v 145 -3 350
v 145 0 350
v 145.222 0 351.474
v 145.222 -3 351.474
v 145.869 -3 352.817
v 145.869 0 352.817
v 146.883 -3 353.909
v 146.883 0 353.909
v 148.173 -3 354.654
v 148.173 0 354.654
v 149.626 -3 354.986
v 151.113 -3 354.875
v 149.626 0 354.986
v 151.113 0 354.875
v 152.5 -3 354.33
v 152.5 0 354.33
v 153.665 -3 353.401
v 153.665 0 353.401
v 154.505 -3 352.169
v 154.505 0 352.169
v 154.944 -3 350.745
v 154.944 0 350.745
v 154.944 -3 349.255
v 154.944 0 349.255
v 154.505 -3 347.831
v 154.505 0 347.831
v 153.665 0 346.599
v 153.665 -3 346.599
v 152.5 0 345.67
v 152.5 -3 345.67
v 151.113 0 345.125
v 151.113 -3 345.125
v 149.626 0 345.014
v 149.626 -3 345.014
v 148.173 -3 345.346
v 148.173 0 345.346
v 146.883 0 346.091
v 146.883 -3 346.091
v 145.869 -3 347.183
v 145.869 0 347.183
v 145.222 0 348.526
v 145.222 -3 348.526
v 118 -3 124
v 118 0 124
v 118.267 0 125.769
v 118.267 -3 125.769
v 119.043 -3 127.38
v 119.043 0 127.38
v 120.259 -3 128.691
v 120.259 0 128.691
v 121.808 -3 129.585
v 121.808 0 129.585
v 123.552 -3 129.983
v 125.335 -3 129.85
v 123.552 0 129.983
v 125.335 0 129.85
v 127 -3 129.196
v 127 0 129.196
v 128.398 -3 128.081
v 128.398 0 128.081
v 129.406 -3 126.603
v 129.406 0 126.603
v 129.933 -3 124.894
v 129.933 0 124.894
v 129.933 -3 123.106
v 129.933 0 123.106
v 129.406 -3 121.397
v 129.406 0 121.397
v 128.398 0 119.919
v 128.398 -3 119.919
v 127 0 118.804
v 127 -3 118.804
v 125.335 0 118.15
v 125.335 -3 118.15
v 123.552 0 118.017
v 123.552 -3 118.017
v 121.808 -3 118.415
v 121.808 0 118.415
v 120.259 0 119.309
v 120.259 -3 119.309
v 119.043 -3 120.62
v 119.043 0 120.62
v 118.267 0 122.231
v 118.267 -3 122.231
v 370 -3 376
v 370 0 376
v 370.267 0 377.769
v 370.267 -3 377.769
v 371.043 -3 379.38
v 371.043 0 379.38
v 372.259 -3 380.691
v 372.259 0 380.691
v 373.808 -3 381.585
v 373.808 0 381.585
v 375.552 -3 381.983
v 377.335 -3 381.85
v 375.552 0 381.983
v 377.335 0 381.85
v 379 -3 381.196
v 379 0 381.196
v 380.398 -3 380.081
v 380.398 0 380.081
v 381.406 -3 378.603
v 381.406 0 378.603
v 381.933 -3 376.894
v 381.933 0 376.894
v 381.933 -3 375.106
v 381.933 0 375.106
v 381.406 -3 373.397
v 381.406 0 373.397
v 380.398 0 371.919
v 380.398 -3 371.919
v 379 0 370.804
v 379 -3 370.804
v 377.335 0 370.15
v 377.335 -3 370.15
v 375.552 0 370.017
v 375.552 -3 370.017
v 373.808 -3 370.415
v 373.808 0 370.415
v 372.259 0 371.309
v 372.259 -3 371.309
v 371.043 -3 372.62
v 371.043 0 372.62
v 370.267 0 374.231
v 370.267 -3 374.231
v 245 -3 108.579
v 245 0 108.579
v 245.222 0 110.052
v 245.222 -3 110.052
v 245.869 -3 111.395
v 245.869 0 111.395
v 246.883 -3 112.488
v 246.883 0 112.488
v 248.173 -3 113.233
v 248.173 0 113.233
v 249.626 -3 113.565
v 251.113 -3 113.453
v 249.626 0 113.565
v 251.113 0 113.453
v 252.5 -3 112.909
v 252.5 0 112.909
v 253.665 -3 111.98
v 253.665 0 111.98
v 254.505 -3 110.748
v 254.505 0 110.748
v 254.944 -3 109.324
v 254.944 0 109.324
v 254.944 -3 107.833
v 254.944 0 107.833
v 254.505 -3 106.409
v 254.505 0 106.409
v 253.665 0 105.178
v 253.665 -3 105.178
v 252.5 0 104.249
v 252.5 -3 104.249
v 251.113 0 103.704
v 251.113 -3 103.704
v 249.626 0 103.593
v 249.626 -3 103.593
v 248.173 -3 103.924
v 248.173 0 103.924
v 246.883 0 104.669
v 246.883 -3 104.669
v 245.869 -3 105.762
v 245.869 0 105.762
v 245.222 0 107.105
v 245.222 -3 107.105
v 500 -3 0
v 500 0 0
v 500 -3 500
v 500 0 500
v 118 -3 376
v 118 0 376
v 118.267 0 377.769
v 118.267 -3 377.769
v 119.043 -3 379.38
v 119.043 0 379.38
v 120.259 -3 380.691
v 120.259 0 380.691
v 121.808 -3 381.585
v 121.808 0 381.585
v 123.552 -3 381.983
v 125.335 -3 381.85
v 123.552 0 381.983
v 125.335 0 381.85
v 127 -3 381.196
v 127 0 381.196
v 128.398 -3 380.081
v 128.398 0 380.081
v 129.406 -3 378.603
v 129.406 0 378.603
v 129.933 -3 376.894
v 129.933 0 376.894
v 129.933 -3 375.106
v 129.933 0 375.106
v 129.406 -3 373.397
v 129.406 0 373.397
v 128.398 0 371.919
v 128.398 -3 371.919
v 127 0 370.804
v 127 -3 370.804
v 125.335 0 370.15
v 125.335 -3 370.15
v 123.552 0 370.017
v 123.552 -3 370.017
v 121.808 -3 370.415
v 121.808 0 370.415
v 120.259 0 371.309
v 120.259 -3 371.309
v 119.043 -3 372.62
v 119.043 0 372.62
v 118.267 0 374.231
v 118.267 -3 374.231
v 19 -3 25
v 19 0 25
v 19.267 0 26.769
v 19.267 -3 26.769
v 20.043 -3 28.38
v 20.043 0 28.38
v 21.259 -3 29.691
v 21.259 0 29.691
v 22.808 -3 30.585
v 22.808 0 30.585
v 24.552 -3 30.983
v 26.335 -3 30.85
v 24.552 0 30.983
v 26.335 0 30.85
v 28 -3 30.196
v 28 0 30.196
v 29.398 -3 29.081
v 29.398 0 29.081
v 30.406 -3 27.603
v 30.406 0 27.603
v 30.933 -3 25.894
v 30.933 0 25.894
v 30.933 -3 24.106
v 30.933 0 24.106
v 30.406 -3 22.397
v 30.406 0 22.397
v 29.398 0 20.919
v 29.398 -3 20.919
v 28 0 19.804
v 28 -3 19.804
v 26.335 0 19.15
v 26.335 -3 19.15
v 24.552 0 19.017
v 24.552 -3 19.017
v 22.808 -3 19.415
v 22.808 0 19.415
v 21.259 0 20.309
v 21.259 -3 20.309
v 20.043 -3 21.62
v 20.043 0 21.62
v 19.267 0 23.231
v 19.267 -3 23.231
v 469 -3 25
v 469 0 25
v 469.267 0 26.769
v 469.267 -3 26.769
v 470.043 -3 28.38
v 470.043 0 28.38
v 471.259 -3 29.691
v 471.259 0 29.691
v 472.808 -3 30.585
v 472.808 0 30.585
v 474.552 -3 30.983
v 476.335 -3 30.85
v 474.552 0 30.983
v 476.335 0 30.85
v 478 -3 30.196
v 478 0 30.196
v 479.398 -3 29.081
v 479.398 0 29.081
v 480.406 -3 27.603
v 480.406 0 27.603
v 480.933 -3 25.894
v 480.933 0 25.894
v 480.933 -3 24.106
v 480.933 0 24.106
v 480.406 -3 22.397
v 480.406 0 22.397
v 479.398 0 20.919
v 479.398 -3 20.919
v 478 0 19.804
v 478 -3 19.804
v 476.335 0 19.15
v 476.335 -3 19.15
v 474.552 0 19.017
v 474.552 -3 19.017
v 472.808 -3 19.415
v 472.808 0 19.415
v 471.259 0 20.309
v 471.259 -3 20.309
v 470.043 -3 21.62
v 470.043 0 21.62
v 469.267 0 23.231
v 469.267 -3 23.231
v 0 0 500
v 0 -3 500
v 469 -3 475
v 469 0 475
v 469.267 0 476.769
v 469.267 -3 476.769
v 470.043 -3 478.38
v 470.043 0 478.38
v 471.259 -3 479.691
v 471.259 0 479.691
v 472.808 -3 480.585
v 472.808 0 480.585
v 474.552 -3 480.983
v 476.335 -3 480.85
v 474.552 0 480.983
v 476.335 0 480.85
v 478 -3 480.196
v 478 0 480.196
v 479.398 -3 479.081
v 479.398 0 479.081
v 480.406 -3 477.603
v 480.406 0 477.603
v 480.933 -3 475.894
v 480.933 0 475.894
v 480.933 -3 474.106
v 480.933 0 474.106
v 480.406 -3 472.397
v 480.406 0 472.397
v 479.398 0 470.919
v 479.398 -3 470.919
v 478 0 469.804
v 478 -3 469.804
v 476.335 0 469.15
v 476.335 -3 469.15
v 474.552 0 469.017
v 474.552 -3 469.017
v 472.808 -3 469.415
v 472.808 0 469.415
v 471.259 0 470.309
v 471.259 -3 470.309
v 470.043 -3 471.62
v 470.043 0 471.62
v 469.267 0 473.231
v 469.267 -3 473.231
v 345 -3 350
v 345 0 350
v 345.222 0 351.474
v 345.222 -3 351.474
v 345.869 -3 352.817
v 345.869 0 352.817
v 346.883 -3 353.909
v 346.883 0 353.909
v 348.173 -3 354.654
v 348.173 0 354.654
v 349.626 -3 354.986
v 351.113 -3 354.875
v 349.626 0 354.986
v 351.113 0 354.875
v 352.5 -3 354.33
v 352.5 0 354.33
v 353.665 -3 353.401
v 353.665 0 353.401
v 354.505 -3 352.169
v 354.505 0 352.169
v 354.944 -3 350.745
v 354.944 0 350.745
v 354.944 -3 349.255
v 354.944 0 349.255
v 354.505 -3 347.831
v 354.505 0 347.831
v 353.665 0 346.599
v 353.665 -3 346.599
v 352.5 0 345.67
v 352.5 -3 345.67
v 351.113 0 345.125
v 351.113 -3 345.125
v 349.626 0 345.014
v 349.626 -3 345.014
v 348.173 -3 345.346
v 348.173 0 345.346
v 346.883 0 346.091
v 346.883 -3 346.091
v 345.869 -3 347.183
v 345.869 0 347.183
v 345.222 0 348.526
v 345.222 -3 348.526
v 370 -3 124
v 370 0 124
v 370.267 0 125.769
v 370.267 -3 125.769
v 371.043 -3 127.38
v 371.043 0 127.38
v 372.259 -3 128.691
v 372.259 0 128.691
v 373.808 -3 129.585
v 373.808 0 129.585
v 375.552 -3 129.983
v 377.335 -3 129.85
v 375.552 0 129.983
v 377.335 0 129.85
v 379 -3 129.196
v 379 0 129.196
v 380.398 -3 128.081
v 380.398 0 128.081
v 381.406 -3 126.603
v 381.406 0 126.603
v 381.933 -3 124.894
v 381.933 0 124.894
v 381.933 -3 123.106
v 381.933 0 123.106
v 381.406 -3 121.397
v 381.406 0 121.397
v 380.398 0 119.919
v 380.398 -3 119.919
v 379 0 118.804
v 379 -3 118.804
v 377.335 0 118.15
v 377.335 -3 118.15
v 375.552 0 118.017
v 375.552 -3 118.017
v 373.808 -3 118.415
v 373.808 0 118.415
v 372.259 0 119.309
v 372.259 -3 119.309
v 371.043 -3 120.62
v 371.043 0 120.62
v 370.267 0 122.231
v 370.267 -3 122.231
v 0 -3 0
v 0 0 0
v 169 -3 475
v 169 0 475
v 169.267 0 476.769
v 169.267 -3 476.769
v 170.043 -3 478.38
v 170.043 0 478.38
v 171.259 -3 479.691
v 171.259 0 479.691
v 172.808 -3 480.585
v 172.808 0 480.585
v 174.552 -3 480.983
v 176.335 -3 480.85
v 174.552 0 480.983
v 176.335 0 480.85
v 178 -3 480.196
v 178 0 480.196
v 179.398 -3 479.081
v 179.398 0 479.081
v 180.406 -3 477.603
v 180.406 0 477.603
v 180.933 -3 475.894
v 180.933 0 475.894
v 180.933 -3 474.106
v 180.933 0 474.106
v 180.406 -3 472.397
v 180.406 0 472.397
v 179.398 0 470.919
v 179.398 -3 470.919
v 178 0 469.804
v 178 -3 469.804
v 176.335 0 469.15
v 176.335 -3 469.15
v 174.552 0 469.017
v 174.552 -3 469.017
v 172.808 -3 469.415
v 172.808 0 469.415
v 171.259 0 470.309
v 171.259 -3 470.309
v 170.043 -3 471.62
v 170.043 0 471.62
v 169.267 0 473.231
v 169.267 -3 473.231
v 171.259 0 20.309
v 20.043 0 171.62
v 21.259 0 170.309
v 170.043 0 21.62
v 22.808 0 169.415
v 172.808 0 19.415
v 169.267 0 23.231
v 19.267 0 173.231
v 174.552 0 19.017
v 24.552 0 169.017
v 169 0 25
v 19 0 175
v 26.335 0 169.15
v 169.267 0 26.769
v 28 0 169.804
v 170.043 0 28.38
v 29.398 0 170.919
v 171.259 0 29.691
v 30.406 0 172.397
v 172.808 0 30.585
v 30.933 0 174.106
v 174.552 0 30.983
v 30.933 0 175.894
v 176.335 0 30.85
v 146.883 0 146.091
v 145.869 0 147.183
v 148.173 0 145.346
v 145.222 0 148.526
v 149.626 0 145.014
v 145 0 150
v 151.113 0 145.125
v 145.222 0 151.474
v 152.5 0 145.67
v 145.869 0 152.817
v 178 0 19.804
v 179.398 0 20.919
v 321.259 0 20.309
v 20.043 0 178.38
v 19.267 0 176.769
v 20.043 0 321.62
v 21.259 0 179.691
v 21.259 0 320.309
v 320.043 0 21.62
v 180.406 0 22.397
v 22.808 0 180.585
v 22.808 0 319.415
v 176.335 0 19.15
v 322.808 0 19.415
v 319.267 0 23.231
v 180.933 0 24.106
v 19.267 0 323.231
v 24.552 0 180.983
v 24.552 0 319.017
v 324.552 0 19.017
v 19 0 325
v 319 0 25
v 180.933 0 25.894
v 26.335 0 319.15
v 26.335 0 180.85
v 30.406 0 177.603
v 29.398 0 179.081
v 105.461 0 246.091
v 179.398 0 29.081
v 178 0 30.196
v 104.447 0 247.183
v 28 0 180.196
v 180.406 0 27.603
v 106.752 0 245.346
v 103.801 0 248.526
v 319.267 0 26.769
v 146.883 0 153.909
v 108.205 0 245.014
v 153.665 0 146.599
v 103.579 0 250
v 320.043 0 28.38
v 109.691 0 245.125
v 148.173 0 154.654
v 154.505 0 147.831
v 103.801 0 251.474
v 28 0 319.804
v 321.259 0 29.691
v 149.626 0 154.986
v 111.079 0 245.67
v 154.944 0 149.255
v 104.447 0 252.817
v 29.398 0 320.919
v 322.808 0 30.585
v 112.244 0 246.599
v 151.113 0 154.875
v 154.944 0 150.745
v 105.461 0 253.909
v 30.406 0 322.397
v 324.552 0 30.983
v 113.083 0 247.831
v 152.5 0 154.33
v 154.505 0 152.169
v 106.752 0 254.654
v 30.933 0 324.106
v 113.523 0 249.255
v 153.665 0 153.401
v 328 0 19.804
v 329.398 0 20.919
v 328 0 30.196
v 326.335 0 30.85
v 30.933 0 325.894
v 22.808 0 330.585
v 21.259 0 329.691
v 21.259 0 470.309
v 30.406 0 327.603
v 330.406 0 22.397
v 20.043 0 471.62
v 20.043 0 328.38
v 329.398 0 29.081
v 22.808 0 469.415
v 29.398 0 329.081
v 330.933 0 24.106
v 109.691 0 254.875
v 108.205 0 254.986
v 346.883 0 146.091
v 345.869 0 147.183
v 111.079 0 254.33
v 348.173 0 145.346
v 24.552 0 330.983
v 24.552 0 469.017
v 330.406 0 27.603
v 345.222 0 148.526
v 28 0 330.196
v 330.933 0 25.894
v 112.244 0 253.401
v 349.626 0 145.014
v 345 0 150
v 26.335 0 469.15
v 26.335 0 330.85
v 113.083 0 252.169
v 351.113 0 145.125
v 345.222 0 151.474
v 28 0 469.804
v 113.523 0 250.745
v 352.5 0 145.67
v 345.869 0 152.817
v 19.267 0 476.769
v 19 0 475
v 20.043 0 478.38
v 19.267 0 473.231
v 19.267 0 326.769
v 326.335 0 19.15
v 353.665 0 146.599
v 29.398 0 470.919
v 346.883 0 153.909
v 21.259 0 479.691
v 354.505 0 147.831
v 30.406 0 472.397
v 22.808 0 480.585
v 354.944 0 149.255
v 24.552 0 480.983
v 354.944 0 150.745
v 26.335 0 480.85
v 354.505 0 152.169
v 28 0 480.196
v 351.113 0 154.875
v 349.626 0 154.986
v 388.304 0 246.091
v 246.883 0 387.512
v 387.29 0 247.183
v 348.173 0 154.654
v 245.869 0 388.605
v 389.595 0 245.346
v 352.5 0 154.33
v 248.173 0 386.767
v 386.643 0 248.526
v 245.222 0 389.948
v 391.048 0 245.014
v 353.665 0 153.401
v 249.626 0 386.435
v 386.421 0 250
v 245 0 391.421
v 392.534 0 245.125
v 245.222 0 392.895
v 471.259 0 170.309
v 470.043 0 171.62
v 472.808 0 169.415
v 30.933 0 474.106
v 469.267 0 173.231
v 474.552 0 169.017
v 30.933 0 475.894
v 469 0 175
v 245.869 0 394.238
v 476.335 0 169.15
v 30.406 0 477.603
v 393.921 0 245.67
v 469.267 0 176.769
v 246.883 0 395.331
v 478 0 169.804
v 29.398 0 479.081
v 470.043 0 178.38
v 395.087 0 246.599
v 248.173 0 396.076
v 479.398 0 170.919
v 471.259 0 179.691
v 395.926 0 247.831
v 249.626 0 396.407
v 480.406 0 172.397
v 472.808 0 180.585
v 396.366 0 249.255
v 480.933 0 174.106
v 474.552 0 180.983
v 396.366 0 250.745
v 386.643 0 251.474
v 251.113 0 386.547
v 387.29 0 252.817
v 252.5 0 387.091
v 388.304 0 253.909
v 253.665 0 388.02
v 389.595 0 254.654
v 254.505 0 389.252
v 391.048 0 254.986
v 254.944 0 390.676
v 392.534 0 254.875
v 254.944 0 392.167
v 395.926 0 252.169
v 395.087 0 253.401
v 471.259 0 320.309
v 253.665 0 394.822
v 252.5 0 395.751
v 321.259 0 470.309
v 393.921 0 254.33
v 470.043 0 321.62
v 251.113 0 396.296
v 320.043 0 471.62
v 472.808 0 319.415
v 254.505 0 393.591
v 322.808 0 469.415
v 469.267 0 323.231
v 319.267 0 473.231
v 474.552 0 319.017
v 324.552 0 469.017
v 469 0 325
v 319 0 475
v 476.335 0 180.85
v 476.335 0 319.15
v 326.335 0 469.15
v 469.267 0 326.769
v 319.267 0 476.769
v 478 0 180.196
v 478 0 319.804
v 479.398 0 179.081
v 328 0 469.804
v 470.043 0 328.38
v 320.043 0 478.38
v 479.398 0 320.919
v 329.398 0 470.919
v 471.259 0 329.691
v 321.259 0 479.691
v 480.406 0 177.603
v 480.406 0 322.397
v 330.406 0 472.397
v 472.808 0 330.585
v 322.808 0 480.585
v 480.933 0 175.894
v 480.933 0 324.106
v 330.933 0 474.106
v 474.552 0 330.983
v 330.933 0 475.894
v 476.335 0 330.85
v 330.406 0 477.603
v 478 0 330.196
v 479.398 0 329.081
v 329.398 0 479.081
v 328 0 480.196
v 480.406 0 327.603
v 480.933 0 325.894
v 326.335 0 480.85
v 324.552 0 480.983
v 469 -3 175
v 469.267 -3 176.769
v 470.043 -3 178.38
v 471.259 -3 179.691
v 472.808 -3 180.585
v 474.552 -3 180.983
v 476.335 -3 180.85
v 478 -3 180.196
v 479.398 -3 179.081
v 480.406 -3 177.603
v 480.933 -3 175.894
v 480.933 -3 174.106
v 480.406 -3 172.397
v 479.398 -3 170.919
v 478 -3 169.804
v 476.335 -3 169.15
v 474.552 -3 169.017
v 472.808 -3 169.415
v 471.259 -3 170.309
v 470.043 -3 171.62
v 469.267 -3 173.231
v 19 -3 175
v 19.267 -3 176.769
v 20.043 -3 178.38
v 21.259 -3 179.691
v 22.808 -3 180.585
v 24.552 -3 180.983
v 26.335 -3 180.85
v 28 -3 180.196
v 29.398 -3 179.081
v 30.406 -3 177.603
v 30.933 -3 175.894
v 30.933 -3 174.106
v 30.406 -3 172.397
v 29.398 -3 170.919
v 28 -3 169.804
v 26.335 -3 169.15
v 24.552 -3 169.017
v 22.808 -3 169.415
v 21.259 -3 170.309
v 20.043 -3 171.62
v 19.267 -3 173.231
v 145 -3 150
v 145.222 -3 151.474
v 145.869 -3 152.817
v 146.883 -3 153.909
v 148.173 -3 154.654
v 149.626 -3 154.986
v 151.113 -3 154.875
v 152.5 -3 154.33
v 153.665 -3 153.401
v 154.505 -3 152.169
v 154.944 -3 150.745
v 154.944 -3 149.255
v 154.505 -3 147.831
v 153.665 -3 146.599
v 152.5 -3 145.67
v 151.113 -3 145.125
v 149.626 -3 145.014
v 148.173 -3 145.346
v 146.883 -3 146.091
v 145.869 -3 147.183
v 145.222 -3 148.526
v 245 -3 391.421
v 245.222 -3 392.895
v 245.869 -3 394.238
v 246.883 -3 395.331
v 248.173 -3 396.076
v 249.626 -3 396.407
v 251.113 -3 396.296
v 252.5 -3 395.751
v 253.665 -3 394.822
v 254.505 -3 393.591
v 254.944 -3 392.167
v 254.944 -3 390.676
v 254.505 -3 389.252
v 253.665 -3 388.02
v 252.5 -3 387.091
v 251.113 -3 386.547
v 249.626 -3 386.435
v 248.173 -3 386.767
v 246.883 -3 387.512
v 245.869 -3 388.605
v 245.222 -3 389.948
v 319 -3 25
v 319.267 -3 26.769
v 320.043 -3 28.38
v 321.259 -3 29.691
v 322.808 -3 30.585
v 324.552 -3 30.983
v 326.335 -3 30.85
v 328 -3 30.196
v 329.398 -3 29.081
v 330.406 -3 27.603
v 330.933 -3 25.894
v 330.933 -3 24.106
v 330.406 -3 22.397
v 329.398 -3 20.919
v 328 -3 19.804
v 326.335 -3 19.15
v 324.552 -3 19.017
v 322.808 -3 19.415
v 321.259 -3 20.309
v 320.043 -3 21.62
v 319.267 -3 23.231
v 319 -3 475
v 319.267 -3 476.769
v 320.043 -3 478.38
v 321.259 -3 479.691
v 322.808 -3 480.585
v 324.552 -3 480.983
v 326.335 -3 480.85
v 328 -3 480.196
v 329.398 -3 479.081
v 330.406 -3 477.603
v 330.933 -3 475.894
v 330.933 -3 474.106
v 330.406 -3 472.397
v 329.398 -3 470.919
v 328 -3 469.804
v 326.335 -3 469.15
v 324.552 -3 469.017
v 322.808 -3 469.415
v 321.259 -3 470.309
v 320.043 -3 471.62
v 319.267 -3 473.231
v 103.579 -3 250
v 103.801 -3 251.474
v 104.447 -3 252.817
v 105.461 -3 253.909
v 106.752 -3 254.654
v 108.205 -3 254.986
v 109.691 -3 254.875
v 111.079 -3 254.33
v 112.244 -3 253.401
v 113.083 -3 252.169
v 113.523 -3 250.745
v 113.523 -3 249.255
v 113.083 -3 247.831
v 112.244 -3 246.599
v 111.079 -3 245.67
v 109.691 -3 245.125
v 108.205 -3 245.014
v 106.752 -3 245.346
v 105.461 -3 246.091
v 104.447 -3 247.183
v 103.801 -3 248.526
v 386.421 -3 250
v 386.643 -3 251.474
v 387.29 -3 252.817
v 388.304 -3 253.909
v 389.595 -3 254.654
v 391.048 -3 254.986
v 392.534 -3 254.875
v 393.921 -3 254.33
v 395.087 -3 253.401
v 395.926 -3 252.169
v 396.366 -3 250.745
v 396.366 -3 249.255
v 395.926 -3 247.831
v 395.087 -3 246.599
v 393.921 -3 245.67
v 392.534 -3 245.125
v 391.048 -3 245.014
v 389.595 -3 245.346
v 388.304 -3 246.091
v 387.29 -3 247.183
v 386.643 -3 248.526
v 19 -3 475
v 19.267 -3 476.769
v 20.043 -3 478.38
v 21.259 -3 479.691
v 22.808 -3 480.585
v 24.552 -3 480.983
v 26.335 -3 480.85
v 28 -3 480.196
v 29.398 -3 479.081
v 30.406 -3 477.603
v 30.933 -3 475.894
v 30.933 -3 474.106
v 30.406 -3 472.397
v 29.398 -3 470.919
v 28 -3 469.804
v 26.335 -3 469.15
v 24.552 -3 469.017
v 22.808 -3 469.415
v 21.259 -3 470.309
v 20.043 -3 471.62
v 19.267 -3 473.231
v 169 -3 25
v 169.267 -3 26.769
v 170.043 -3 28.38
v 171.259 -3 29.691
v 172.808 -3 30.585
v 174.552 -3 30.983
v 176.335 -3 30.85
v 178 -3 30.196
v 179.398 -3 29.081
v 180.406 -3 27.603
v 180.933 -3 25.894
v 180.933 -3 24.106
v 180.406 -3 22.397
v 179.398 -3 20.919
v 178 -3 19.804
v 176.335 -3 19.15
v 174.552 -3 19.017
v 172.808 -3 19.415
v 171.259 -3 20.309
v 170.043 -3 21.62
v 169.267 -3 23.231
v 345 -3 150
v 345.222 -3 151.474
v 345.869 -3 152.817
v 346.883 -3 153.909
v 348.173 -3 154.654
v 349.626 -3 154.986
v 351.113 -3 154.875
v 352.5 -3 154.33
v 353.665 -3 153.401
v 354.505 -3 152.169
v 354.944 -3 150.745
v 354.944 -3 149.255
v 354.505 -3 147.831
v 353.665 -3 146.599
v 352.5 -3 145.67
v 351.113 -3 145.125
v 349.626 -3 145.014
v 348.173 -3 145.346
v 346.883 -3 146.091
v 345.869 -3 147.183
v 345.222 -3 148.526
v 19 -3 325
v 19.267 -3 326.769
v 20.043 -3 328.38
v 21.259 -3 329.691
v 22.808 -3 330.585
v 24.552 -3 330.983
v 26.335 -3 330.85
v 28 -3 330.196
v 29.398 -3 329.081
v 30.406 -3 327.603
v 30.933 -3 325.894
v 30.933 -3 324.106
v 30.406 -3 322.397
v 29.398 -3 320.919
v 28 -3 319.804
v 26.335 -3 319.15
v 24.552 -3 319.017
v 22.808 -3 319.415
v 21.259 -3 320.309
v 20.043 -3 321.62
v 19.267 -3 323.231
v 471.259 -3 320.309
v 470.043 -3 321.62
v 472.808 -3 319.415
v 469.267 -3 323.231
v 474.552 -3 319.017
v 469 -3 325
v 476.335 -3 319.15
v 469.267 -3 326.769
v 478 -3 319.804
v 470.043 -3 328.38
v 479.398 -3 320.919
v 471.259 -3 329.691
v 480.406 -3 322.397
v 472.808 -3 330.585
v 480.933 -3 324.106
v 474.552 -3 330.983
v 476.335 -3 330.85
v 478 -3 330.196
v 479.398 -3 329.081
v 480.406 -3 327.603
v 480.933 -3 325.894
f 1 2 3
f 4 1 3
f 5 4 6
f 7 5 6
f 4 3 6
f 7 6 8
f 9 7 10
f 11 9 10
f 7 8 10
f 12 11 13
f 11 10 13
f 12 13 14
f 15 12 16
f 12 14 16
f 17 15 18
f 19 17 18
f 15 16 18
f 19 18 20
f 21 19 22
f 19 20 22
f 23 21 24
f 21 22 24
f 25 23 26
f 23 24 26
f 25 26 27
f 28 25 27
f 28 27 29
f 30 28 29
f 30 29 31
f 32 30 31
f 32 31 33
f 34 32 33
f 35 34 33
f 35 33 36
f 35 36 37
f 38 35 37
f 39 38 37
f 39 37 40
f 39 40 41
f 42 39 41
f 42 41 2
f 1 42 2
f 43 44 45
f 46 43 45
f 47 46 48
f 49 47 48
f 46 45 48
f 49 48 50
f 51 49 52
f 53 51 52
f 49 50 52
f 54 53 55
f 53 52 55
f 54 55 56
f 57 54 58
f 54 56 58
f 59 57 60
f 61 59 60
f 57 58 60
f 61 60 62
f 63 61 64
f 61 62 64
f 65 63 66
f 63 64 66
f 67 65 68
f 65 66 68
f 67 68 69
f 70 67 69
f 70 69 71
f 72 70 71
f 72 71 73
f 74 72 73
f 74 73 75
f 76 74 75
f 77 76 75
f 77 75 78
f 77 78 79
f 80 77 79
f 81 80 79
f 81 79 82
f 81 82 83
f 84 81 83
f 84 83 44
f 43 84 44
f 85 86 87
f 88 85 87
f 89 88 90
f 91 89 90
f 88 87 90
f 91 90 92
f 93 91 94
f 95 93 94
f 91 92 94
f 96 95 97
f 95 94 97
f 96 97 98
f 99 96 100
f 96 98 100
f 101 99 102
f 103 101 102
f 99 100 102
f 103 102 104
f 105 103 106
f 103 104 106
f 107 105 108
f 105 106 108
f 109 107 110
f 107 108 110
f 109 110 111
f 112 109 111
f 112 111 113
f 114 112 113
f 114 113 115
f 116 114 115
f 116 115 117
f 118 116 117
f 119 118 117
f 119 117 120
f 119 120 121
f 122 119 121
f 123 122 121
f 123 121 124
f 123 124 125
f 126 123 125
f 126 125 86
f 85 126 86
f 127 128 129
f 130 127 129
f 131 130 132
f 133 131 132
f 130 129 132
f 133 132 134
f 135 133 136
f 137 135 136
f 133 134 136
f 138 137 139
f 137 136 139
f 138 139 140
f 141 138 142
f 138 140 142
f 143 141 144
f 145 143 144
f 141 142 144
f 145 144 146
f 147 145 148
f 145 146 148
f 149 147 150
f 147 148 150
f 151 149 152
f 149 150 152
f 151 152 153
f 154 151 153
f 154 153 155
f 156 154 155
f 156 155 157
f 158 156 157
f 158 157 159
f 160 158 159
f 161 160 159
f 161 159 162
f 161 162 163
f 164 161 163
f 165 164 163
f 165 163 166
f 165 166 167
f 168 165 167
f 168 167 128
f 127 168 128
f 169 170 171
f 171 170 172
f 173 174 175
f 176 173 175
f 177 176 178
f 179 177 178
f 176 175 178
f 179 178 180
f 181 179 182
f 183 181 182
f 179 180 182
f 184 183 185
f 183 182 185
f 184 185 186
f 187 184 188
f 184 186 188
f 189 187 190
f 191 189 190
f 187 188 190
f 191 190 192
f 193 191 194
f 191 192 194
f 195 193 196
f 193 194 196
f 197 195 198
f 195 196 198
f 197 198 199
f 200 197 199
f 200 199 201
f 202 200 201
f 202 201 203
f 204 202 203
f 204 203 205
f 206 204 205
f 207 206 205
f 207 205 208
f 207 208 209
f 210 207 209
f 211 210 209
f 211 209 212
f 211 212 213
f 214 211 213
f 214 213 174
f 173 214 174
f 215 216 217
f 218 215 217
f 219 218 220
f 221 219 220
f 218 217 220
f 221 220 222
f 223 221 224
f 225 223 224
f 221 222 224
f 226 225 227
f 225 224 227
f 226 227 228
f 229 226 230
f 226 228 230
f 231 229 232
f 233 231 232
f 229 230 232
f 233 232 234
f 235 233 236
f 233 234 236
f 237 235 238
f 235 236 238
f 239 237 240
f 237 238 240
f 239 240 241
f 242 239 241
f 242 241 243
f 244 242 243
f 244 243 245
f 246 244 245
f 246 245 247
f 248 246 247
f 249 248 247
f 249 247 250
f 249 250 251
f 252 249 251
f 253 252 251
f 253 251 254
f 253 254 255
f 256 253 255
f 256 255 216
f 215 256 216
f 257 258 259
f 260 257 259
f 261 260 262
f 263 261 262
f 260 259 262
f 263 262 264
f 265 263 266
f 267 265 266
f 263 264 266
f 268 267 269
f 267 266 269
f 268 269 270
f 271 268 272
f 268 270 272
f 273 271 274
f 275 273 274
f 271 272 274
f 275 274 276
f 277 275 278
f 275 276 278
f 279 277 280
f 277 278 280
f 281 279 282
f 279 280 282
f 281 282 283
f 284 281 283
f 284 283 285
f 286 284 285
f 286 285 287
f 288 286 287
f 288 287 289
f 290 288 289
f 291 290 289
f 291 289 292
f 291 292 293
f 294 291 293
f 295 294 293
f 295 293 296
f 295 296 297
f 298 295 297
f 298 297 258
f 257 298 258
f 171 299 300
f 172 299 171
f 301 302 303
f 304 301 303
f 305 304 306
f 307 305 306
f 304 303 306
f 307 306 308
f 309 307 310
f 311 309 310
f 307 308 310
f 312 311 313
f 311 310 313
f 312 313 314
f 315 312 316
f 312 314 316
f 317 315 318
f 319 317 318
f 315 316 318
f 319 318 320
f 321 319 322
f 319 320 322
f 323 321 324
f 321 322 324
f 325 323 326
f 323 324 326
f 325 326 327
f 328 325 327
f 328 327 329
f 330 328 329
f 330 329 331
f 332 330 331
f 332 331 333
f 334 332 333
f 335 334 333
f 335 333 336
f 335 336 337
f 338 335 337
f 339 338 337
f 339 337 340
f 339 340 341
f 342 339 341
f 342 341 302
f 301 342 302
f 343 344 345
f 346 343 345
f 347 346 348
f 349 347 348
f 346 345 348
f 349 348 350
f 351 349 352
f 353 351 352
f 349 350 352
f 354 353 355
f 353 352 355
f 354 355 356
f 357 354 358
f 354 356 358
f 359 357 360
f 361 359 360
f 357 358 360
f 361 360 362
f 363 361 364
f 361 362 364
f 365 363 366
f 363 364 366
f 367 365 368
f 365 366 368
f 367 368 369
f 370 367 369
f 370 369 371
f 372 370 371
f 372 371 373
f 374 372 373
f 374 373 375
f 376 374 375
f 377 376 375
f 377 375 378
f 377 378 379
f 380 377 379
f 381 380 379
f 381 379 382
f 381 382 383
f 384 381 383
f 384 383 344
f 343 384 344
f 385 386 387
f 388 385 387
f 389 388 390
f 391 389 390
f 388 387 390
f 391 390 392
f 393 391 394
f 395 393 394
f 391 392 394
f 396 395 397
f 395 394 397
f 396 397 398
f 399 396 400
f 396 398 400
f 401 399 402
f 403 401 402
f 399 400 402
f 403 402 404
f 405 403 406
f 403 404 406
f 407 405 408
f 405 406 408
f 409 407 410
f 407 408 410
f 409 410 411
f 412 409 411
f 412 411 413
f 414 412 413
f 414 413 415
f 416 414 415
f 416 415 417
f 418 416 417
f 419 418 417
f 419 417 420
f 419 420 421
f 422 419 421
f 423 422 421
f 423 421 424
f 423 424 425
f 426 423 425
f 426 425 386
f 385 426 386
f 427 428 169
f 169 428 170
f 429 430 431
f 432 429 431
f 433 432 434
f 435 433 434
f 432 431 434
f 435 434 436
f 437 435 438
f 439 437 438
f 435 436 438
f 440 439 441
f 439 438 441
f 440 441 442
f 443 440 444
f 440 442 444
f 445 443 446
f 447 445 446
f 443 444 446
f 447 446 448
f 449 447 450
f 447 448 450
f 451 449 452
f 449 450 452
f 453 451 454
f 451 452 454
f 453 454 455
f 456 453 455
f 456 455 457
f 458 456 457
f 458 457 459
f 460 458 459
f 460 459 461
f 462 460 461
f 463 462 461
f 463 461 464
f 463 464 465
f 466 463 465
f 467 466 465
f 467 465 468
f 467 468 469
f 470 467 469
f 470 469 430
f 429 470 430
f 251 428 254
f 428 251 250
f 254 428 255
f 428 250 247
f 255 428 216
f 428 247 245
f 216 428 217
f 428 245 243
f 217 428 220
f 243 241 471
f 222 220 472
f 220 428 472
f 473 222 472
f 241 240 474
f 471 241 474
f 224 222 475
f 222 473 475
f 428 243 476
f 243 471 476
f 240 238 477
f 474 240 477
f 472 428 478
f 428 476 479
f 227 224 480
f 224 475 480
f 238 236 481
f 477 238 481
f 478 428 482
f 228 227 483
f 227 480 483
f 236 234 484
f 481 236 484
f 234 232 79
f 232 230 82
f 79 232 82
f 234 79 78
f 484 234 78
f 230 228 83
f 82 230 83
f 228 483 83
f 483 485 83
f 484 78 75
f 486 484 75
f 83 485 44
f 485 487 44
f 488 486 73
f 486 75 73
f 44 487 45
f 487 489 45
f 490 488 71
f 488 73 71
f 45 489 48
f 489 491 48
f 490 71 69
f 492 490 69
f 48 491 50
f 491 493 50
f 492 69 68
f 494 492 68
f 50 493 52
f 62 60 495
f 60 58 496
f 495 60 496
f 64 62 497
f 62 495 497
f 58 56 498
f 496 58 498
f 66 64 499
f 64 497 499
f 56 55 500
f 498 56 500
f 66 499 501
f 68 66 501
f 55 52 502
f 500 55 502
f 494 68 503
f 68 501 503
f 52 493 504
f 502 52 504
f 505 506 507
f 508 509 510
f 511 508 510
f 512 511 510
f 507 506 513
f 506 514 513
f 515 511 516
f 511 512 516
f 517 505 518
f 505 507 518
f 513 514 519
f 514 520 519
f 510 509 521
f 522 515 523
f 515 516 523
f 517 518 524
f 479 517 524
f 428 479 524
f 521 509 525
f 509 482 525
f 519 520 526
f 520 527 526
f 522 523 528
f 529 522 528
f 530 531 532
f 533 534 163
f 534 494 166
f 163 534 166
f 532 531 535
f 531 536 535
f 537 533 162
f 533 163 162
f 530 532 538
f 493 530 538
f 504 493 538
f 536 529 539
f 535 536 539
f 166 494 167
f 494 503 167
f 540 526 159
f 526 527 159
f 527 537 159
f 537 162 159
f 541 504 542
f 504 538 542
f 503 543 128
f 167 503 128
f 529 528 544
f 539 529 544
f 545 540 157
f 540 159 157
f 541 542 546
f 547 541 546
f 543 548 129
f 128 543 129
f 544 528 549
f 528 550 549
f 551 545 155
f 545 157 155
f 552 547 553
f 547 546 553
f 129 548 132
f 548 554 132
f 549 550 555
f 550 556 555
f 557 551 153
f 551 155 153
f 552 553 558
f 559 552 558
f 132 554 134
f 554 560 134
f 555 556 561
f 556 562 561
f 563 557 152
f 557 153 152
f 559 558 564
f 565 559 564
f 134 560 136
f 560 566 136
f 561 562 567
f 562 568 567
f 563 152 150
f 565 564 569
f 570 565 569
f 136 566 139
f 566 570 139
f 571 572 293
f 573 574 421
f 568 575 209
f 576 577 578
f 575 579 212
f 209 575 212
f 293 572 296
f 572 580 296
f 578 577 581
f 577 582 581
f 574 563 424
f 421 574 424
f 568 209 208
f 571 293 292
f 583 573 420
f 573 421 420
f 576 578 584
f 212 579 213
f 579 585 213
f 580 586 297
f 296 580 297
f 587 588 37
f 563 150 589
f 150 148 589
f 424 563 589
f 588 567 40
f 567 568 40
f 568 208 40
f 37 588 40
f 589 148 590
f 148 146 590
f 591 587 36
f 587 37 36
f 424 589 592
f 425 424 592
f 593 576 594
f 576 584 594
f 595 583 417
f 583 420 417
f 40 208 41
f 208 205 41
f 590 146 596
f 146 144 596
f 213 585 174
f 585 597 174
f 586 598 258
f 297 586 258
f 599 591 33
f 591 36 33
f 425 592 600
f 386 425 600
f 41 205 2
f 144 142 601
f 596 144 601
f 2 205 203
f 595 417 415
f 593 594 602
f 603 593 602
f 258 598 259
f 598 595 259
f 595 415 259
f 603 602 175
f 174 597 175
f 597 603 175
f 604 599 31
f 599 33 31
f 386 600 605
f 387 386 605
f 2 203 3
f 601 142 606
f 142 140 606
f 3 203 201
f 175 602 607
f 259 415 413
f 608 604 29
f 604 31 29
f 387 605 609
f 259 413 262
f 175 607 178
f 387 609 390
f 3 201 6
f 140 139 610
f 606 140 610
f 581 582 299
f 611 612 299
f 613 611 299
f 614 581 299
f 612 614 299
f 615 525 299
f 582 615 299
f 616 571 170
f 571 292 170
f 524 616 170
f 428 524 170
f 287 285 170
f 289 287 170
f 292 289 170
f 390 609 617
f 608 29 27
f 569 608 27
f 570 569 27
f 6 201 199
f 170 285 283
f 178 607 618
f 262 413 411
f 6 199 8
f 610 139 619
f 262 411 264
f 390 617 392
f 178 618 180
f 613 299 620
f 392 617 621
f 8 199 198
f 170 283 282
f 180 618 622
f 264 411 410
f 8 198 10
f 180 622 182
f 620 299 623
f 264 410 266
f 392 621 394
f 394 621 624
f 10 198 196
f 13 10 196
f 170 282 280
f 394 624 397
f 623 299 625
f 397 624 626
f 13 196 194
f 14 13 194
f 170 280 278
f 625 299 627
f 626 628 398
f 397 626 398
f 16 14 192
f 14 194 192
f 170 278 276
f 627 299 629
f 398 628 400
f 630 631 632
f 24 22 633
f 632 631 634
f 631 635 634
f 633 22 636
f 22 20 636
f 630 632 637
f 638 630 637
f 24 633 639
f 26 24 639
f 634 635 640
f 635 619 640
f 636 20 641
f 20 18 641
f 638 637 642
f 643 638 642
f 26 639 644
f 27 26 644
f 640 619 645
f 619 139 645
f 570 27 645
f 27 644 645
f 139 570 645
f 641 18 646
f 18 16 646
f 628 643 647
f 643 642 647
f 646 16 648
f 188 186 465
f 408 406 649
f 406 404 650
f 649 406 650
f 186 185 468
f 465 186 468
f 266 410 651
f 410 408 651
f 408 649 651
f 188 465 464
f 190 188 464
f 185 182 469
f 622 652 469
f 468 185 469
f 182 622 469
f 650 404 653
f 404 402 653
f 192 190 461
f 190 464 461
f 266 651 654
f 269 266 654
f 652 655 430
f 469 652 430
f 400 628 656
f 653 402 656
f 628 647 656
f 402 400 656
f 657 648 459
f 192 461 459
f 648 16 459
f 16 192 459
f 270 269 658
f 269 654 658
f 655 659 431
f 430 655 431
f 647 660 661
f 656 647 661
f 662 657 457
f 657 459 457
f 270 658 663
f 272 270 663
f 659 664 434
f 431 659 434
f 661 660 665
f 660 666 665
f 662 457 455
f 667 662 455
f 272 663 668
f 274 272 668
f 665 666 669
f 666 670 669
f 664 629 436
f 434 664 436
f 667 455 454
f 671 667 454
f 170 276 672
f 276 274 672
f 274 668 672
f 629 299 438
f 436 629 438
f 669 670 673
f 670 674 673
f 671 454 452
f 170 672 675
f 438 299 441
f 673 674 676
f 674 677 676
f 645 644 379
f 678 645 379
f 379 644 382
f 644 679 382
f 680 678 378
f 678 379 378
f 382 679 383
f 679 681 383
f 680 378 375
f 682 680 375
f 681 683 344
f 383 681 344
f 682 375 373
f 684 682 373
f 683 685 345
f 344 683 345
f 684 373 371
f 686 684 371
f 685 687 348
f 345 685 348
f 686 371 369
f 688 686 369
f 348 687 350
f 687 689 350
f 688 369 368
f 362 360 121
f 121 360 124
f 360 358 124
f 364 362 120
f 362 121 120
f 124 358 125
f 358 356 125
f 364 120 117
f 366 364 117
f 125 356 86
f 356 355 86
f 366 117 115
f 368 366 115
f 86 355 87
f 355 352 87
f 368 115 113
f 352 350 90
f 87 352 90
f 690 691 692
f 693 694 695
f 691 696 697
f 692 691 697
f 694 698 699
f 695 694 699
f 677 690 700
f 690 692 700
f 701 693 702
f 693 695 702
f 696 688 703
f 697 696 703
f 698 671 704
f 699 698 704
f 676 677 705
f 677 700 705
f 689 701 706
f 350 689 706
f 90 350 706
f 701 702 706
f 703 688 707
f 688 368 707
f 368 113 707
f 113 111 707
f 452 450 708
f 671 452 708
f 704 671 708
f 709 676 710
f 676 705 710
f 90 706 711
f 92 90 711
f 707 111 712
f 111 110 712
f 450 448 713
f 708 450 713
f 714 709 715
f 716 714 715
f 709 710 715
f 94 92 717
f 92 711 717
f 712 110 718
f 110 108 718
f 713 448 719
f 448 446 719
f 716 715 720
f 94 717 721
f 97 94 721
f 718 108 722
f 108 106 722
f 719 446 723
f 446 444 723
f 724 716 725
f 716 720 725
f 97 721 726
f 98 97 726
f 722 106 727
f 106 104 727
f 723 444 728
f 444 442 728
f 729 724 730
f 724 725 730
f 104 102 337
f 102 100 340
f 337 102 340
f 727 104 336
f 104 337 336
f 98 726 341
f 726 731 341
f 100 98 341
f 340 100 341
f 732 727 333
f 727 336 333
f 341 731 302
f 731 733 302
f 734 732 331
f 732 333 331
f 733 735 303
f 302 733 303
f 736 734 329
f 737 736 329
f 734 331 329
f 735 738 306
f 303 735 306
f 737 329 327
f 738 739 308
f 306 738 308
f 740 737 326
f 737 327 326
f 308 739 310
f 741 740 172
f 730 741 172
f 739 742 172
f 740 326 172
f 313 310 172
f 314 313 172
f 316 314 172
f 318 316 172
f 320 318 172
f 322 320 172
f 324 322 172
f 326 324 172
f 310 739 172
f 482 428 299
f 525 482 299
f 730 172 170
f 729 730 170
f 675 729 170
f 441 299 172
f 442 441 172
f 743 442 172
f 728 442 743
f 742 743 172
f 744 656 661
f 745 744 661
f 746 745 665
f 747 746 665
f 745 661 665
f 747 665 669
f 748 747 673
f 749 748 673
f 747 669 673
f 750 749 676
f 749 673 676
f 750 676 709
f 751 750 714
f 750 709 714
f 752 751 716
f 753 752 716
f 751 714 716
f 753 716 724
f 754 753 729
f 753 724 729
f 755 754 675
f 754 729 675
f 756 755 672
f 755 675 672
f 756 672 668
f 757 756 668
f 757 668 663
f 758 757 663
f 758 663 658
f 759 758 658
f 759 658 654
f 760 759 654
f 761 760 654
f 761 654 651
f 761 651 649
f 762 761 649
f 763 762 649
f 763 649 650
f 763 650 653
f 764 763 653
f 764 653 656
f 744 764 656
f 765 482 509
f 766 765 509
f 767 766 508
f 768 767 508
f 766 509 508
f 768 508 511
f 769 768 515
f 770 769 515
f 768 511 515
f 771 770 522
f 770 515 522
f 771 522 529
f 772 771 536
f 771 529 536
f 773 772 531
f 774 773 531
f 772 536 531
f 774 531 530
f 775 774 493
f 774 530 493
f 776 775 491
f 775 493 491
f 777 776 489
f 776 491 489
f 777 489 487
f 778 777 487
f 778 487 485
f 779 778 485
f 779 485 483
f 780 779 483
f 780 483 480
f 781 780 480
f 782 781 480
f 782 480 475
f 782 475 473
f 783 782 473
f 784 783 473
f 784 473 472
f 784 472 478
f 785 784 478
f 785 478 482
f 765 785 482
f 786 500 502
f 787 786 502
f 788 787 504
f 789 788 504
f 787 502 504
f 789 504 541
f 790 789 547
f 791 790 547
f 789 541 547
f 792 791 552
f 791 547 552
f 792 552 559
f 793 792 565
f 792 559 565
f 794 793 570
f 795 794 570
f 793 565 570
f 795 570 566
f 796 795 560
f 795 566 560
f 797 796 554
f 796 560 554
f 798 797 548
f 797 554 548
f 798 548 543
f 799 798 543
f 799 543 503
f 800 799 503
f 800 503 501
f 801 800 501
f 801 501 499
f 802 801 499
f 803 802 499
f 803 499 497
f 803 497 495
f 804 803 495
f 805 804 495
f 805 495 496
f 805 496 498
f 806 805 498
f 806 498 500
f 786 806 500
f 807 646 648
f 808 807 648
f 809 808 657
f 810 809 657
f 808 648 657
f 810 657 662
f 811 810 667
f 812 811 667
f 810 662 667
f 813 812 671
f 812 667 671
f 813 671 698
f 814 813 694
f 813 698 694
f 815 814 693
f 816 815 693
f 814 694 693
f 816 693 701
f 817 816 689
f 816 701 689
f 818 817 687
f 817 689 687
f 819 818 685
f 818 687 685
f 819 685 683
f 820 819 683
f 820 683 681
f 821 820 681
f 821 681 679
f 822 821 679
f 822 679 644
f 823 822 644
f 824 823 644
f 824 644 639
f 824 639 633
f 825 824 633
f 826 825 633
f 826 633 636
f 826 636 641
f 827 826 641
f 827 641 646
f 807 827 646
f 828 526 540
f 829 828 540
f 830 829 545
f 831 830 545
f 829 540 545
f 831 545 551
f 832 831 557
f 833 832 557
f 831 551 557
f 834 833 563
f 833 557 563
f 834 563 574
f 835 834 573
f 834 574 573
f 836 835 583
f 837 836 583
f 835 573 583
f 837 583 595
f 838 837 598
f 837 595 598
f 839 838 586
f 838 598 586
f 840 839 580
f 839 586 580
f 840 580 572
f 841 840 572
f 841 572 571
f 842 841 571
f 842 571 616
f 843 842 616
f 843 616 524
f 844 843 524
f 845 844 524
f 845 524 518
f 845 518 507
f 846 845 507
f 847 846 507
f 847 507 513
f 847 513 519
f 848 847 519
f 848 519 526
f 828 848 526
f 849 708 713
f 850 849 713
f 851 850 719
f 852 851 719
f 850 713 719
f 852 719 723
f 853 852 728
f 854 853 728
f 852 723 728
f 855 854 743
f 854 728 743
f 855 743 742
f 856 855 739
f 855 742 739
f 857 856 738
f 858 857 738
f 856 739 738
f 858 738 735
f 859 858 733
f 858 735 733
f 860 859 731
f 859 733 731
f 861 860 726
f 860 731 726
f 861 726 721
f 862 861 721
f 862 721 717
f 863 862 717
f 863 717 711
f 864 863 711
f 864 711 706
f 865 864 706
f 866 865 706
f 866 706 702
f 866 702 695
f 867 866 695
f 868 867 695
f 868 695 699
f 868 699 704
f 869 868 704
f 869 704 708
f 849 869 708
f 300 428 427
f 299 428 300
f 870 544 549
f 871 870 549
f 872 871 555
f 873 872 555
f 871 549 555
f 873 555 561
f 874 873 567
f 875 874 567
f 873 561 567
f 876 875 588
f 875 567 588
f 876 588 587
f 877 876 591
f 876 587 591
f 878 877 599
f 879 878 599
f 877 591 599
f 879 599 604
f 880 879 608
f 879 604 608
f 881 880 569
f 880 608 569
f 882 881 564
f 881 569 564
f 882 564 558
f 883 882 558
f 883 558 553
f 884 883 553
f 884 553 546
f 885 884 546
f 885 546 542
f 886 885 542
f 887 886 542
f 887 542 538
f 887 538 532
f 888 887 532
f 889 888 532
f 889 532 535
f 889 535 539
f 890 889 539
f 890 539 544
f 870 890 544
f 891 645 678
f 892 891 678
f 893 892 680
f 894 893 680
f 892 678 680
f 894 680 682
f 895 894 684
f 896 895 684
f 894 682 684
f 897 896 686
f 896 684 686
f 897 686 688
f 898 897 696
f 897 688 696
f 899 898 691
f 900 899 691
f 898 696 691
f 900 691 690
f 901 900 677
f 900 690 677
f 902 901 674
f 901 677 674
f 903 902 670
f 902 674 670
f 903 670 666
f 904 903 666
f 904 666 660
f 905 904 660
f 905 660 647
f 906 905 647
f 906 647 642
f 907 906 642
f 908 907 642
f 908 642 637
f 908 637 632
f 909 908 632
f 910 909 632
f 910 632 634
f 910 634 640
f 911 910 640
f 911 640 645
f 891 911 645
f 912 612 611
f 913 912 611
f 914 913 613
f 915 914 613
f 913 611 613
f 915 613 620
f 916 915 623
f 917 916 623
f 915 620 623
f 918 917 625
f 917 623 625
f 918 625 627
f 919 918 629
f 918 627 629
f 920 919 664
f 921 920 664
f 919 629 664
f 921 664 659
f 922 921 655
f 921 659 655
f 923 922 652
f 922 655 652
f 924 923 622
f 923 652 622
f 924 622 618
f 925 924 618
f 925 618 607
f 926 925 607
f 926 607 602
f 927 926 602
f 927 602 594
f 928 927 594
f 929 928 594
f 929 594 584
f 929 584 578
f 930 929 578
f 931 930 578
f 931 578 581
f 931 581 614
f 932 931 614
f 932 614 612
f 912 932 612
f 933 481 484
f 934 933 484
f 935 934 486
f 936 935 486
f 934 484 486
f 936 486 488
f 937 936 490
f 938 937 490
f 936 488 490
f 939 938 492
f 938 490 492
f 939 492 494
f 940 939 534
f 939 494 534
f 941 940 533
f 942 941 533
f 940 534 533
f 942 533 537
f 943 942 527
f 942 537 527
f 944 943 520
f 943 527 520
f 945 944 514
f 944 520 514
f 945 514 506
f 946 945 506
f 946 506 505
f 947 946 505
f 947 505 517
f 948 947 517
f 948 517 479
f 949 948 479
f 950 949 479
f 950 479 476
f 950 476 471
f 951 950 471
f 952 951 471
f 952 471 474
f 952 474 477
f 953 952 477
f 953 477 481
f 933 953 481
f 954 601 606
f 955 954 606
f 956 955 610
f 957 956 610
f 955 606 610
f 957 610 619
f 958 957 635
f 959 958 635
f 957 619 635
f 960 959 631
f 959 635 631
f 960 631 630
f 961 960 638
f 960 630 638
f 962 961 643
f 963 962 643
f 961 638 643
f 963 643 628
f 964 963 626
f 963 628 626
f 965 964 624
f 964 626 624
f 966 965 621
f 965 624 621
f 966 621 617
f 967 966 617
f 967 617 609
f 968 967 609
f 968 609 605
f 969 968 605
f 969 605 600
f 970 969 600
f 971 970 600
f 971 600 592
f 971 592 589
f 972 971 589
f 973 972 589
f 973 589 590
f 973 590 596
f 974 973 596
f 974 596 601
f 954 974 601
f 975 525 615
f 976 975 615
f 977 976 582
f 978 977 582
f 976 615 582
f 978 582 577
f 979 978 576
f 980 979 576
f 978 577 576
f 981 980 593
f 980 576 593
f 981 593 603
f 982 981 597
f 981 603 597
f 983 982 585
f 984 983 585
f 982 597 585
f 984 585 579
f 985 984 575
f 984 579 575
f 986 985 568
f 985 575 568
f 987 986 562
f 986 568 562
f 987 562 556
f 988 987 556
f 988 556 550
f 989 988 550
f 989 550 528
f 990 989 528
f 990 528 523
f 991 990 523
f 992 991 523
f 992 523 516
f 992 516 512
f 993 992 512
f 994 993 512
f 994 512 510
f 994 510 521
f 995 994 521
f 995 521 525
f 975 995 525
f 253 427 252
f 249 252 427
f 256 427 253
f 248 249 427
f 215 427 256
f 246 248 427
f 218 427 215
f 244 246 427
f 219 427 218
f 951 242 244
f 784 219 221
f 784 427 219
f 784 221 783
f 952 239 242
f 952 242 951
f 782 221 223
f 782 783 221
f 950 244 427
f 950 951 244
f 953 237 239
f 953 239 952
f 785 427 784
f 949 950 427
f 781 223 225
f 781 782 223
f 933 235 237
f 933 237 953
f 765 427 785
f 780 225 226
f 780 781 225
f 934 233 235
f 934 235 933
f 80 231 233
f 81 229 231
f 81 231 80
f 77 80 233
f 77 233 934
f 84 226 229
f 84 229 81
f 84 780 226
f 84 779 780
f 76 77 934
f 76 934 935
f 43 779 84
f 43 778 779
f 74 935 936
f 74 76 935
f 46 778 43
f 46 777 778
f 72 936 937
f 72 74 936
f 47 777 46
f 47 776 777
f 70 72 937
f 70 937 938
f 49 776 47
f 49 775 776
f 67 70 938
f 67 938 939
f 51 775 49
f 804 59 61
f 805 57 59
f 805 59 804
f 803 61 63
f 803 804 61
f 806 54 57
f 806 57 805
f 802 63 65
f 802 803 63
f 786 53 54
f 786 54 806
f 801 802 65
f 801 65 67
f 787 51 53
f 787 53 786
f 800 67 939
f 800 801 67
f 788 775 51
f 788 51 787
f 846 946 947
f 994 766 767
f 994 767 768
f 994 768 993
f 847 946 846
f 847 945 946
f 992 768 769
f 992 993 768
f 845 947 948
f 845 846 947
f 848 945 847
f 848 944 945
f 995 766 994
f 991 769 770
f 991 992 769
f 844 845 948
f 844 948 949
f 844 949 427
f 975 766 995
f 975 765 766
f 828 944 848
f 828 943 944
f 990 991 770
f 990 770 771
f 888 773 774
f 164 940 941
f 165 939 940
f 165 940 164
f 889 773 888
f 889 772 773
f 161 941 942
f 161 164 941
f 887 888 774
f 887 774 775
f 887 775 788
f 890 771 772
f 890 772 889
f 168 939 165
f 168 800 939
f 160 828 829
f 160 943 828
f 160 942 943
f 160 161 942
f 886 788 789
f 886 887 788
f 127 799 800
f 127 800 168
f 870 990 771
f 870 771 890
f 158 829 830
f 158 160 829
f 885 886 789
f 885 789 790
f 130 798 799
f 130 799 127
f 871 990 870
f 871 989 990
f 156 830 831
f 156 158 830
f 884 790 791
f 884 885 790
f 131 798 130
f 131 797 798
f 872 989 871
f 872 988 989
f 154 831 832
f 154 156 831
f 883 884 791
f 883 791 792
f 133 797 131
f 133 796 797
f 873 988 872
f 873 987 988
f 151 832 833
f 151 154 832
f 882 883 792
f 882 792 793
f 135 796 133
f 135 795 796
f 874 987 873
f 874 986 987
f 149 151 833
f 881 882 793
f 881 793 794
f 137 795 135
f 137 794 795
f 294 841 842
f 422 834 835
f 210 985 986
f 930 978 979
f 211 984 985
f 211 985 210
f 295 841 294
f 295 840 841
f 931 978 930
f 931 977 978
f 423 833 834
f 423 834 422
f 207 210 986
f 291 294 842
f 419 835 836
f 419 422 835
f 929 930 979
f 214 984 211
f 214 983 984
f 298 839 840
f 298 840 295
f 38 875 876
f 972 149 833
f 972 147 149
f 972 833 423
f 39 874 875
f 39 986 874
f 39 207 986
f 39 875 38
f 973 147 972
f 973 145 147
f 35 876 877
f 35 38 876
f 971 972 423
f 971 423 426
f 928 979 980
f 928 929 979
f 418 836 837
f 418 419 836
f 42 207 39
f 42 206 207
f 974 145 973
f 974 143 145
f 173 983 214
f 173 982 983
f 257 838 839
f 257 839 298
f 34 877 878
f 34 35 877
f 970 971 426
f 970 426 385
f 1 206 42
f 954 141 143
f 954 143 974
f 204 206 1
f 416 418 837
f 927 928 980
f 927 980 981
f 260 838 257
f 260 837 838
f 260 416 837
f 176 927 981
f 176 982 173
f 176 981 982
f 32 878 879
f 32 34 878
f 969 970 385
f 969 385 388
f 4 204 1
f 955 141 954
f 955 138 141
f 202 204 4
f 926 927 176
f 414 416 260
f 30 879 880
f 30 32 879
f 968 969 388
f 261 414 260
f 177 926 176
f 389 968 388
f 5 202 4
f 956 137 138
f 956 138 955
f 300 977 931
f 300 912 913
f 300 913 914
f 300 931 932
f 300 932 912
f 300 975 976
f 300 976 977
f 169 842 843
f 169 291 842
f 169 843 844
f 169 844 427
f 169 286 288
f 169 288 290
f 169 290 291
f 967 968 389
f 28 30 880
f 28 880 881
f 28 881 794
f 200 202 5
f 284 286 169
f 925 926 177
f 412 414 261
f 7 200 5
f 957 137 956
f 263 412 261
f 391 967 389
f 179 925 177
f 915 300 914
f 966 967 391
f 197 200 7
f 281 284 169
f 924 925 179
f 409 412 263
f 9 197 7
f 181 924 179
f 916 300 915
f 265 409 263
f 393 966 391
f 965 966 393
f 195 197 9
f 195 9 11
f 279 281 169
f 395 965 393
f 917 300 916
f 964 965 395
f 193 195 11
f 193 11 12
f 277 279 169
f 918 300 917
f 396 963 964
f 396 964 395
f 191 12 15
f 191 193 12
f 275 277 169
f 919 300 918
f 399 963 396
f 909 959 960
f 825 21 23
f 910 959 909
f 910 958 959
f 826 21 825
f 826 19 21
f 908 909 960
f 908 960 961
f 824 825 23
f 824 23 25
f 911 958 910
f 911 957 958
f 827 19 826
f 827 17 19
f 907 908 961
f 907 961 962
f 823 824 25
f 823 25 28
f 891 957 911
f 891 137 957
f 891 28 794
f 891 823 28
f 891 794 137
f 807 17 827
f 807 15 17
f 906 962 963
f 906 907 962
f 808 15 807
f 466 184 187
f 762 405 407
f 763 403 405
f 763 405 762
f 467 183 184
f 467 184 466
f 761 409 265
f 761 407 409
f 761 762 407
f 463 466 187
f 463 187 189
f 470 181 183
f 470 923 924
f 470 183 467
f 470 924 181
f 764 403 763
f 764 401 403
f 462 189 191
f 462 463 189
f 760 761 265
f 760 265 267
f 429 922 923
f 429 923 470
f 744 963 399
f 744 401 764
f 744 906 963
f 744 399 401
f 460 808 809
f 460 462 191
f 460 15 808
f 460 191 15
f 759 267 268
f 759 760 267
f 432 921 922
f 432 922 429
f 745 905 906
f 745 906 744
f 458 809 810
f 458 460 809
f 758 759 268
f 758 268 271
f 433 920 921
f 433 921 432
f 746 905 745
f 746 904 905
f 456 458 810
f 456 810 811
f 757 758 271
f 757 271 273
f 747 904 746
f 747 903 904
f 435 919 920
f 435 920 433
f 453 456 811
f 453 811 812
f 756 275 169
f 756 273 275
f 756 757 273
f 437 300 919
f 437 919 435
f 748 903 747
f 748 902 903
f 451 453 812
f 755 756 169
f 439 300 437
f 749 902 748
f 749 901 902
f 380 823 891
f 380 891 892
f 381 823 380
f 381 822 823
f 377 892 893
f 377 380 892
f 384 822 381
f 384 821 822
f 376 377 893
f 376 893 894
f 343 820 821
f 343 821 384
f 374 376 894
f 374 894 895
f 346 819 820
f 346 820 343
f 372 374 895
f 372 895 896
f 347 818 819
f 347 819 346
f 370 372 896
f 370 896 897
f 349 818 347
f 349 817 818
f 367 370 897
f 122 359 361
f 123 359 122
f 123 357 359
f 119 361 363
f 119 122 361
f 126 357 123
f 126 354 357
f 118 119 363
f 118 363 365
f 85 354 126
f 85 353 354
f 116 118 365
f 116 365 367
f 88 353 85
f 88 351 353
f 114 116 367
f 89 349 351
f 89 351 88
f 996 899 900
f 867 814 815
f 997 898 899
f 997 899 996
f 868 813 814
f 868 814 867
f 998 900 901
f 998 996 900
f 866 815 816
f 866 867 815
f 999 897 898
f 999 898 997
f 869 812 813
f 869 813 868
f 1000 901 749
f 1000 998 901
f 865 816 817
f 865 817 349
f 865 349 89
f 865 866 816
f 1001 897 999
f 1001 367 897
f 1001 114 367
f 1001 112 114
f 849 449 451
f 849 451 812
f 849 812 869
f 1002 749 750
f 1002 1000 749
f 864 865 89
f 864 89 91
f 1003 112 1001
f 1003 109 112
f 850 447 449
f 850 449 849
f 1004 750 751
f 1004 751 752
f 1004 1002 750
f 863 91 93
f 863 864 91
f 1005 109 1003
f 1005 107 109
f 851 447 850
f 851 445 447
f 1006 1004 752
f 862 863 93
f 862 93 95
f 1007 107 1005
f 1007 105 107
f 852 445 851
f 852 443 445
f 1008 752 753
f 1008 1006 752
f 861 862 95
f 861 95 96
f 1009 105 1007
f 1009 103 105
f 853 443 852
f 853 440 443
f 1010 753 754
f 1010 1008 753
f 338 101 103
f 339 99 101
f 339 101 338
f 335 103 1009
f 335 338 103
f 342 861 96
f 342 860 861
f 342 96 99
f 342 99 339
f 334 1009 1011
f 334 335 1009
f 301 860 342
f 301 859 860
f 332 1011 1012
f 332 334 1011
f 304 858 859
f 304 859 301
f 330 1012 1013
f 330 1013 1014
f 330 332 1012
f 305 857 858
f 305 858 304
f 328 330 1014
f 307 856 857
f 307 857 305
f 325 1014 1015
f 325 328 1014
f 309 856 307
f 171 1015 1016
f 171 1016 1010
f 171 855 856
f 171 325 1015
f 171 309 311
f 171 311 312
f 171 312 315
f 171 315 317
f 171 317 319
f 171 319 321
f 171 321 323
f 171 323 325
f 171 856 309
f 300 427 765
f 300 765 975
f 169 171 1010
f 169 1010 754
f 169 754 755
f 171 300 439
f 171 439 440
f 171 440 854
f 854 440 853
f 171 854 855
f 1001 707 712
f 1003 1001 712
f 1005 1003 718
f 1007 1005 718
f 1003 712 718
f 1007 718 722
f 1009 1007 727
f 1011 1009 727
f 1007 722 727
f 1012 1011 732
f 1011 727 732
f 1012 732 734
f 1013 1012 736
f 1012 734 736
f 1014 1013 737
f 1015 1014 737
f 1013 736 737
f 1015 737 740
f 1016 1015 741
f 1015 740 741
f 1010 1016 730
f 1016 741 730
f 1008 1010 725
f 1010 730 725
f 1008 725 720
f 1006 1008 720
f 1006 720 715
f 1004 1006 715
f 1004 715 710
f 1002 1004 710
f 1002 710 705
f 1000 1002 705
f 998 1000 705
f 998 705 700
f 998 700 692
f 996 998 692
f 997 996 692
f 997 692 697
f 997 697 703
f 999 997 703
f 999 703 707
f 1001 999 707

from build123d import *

# Parameters (mm, degrees)
F0_W     = 500
F0_H     = 500
F1_DEPTH = 3
F3_D     = 10
F5_D     = 12
F7_D     = 12


with BuildPart() as f1:
    # F0 (on Front) → F1 (new body)
    with BuildSketch(Plane.XZ):
        with Locations((250, 250)):
            Rectangle(F0_W, F0_H)
    extrude(amount=F1_DEPTH)

    # F3 (through all)
    with Locations(Plane.XZ.offset(3)):
        with Locations((150, 350), (250, 391.421356), (350, 350), (391.421356, 250), (350, 150), (250, 108.578644), (150, 150), (108.578644, 250)):
            Hole(F3_D / 2)

    # F5 (through all)
    with Locations(Plane.XZ.offset(3)):
        with Locations((25, 325), (25, 475), (175, 475), (325, 475), (475, 475), (475, 325), (475, 175), (475, 25), (325, 25), (175, 25), (25, 25), (25, 175)):
            Hole(F5_D / 2)

    # F7 (through all)
    with Locations(Plane.XZ.offset(3)):
        with Locations((124, 376), (376, 376), (376, 124), (124, 124)):
            Hole(F7_D / 2)


solid = f1.part
